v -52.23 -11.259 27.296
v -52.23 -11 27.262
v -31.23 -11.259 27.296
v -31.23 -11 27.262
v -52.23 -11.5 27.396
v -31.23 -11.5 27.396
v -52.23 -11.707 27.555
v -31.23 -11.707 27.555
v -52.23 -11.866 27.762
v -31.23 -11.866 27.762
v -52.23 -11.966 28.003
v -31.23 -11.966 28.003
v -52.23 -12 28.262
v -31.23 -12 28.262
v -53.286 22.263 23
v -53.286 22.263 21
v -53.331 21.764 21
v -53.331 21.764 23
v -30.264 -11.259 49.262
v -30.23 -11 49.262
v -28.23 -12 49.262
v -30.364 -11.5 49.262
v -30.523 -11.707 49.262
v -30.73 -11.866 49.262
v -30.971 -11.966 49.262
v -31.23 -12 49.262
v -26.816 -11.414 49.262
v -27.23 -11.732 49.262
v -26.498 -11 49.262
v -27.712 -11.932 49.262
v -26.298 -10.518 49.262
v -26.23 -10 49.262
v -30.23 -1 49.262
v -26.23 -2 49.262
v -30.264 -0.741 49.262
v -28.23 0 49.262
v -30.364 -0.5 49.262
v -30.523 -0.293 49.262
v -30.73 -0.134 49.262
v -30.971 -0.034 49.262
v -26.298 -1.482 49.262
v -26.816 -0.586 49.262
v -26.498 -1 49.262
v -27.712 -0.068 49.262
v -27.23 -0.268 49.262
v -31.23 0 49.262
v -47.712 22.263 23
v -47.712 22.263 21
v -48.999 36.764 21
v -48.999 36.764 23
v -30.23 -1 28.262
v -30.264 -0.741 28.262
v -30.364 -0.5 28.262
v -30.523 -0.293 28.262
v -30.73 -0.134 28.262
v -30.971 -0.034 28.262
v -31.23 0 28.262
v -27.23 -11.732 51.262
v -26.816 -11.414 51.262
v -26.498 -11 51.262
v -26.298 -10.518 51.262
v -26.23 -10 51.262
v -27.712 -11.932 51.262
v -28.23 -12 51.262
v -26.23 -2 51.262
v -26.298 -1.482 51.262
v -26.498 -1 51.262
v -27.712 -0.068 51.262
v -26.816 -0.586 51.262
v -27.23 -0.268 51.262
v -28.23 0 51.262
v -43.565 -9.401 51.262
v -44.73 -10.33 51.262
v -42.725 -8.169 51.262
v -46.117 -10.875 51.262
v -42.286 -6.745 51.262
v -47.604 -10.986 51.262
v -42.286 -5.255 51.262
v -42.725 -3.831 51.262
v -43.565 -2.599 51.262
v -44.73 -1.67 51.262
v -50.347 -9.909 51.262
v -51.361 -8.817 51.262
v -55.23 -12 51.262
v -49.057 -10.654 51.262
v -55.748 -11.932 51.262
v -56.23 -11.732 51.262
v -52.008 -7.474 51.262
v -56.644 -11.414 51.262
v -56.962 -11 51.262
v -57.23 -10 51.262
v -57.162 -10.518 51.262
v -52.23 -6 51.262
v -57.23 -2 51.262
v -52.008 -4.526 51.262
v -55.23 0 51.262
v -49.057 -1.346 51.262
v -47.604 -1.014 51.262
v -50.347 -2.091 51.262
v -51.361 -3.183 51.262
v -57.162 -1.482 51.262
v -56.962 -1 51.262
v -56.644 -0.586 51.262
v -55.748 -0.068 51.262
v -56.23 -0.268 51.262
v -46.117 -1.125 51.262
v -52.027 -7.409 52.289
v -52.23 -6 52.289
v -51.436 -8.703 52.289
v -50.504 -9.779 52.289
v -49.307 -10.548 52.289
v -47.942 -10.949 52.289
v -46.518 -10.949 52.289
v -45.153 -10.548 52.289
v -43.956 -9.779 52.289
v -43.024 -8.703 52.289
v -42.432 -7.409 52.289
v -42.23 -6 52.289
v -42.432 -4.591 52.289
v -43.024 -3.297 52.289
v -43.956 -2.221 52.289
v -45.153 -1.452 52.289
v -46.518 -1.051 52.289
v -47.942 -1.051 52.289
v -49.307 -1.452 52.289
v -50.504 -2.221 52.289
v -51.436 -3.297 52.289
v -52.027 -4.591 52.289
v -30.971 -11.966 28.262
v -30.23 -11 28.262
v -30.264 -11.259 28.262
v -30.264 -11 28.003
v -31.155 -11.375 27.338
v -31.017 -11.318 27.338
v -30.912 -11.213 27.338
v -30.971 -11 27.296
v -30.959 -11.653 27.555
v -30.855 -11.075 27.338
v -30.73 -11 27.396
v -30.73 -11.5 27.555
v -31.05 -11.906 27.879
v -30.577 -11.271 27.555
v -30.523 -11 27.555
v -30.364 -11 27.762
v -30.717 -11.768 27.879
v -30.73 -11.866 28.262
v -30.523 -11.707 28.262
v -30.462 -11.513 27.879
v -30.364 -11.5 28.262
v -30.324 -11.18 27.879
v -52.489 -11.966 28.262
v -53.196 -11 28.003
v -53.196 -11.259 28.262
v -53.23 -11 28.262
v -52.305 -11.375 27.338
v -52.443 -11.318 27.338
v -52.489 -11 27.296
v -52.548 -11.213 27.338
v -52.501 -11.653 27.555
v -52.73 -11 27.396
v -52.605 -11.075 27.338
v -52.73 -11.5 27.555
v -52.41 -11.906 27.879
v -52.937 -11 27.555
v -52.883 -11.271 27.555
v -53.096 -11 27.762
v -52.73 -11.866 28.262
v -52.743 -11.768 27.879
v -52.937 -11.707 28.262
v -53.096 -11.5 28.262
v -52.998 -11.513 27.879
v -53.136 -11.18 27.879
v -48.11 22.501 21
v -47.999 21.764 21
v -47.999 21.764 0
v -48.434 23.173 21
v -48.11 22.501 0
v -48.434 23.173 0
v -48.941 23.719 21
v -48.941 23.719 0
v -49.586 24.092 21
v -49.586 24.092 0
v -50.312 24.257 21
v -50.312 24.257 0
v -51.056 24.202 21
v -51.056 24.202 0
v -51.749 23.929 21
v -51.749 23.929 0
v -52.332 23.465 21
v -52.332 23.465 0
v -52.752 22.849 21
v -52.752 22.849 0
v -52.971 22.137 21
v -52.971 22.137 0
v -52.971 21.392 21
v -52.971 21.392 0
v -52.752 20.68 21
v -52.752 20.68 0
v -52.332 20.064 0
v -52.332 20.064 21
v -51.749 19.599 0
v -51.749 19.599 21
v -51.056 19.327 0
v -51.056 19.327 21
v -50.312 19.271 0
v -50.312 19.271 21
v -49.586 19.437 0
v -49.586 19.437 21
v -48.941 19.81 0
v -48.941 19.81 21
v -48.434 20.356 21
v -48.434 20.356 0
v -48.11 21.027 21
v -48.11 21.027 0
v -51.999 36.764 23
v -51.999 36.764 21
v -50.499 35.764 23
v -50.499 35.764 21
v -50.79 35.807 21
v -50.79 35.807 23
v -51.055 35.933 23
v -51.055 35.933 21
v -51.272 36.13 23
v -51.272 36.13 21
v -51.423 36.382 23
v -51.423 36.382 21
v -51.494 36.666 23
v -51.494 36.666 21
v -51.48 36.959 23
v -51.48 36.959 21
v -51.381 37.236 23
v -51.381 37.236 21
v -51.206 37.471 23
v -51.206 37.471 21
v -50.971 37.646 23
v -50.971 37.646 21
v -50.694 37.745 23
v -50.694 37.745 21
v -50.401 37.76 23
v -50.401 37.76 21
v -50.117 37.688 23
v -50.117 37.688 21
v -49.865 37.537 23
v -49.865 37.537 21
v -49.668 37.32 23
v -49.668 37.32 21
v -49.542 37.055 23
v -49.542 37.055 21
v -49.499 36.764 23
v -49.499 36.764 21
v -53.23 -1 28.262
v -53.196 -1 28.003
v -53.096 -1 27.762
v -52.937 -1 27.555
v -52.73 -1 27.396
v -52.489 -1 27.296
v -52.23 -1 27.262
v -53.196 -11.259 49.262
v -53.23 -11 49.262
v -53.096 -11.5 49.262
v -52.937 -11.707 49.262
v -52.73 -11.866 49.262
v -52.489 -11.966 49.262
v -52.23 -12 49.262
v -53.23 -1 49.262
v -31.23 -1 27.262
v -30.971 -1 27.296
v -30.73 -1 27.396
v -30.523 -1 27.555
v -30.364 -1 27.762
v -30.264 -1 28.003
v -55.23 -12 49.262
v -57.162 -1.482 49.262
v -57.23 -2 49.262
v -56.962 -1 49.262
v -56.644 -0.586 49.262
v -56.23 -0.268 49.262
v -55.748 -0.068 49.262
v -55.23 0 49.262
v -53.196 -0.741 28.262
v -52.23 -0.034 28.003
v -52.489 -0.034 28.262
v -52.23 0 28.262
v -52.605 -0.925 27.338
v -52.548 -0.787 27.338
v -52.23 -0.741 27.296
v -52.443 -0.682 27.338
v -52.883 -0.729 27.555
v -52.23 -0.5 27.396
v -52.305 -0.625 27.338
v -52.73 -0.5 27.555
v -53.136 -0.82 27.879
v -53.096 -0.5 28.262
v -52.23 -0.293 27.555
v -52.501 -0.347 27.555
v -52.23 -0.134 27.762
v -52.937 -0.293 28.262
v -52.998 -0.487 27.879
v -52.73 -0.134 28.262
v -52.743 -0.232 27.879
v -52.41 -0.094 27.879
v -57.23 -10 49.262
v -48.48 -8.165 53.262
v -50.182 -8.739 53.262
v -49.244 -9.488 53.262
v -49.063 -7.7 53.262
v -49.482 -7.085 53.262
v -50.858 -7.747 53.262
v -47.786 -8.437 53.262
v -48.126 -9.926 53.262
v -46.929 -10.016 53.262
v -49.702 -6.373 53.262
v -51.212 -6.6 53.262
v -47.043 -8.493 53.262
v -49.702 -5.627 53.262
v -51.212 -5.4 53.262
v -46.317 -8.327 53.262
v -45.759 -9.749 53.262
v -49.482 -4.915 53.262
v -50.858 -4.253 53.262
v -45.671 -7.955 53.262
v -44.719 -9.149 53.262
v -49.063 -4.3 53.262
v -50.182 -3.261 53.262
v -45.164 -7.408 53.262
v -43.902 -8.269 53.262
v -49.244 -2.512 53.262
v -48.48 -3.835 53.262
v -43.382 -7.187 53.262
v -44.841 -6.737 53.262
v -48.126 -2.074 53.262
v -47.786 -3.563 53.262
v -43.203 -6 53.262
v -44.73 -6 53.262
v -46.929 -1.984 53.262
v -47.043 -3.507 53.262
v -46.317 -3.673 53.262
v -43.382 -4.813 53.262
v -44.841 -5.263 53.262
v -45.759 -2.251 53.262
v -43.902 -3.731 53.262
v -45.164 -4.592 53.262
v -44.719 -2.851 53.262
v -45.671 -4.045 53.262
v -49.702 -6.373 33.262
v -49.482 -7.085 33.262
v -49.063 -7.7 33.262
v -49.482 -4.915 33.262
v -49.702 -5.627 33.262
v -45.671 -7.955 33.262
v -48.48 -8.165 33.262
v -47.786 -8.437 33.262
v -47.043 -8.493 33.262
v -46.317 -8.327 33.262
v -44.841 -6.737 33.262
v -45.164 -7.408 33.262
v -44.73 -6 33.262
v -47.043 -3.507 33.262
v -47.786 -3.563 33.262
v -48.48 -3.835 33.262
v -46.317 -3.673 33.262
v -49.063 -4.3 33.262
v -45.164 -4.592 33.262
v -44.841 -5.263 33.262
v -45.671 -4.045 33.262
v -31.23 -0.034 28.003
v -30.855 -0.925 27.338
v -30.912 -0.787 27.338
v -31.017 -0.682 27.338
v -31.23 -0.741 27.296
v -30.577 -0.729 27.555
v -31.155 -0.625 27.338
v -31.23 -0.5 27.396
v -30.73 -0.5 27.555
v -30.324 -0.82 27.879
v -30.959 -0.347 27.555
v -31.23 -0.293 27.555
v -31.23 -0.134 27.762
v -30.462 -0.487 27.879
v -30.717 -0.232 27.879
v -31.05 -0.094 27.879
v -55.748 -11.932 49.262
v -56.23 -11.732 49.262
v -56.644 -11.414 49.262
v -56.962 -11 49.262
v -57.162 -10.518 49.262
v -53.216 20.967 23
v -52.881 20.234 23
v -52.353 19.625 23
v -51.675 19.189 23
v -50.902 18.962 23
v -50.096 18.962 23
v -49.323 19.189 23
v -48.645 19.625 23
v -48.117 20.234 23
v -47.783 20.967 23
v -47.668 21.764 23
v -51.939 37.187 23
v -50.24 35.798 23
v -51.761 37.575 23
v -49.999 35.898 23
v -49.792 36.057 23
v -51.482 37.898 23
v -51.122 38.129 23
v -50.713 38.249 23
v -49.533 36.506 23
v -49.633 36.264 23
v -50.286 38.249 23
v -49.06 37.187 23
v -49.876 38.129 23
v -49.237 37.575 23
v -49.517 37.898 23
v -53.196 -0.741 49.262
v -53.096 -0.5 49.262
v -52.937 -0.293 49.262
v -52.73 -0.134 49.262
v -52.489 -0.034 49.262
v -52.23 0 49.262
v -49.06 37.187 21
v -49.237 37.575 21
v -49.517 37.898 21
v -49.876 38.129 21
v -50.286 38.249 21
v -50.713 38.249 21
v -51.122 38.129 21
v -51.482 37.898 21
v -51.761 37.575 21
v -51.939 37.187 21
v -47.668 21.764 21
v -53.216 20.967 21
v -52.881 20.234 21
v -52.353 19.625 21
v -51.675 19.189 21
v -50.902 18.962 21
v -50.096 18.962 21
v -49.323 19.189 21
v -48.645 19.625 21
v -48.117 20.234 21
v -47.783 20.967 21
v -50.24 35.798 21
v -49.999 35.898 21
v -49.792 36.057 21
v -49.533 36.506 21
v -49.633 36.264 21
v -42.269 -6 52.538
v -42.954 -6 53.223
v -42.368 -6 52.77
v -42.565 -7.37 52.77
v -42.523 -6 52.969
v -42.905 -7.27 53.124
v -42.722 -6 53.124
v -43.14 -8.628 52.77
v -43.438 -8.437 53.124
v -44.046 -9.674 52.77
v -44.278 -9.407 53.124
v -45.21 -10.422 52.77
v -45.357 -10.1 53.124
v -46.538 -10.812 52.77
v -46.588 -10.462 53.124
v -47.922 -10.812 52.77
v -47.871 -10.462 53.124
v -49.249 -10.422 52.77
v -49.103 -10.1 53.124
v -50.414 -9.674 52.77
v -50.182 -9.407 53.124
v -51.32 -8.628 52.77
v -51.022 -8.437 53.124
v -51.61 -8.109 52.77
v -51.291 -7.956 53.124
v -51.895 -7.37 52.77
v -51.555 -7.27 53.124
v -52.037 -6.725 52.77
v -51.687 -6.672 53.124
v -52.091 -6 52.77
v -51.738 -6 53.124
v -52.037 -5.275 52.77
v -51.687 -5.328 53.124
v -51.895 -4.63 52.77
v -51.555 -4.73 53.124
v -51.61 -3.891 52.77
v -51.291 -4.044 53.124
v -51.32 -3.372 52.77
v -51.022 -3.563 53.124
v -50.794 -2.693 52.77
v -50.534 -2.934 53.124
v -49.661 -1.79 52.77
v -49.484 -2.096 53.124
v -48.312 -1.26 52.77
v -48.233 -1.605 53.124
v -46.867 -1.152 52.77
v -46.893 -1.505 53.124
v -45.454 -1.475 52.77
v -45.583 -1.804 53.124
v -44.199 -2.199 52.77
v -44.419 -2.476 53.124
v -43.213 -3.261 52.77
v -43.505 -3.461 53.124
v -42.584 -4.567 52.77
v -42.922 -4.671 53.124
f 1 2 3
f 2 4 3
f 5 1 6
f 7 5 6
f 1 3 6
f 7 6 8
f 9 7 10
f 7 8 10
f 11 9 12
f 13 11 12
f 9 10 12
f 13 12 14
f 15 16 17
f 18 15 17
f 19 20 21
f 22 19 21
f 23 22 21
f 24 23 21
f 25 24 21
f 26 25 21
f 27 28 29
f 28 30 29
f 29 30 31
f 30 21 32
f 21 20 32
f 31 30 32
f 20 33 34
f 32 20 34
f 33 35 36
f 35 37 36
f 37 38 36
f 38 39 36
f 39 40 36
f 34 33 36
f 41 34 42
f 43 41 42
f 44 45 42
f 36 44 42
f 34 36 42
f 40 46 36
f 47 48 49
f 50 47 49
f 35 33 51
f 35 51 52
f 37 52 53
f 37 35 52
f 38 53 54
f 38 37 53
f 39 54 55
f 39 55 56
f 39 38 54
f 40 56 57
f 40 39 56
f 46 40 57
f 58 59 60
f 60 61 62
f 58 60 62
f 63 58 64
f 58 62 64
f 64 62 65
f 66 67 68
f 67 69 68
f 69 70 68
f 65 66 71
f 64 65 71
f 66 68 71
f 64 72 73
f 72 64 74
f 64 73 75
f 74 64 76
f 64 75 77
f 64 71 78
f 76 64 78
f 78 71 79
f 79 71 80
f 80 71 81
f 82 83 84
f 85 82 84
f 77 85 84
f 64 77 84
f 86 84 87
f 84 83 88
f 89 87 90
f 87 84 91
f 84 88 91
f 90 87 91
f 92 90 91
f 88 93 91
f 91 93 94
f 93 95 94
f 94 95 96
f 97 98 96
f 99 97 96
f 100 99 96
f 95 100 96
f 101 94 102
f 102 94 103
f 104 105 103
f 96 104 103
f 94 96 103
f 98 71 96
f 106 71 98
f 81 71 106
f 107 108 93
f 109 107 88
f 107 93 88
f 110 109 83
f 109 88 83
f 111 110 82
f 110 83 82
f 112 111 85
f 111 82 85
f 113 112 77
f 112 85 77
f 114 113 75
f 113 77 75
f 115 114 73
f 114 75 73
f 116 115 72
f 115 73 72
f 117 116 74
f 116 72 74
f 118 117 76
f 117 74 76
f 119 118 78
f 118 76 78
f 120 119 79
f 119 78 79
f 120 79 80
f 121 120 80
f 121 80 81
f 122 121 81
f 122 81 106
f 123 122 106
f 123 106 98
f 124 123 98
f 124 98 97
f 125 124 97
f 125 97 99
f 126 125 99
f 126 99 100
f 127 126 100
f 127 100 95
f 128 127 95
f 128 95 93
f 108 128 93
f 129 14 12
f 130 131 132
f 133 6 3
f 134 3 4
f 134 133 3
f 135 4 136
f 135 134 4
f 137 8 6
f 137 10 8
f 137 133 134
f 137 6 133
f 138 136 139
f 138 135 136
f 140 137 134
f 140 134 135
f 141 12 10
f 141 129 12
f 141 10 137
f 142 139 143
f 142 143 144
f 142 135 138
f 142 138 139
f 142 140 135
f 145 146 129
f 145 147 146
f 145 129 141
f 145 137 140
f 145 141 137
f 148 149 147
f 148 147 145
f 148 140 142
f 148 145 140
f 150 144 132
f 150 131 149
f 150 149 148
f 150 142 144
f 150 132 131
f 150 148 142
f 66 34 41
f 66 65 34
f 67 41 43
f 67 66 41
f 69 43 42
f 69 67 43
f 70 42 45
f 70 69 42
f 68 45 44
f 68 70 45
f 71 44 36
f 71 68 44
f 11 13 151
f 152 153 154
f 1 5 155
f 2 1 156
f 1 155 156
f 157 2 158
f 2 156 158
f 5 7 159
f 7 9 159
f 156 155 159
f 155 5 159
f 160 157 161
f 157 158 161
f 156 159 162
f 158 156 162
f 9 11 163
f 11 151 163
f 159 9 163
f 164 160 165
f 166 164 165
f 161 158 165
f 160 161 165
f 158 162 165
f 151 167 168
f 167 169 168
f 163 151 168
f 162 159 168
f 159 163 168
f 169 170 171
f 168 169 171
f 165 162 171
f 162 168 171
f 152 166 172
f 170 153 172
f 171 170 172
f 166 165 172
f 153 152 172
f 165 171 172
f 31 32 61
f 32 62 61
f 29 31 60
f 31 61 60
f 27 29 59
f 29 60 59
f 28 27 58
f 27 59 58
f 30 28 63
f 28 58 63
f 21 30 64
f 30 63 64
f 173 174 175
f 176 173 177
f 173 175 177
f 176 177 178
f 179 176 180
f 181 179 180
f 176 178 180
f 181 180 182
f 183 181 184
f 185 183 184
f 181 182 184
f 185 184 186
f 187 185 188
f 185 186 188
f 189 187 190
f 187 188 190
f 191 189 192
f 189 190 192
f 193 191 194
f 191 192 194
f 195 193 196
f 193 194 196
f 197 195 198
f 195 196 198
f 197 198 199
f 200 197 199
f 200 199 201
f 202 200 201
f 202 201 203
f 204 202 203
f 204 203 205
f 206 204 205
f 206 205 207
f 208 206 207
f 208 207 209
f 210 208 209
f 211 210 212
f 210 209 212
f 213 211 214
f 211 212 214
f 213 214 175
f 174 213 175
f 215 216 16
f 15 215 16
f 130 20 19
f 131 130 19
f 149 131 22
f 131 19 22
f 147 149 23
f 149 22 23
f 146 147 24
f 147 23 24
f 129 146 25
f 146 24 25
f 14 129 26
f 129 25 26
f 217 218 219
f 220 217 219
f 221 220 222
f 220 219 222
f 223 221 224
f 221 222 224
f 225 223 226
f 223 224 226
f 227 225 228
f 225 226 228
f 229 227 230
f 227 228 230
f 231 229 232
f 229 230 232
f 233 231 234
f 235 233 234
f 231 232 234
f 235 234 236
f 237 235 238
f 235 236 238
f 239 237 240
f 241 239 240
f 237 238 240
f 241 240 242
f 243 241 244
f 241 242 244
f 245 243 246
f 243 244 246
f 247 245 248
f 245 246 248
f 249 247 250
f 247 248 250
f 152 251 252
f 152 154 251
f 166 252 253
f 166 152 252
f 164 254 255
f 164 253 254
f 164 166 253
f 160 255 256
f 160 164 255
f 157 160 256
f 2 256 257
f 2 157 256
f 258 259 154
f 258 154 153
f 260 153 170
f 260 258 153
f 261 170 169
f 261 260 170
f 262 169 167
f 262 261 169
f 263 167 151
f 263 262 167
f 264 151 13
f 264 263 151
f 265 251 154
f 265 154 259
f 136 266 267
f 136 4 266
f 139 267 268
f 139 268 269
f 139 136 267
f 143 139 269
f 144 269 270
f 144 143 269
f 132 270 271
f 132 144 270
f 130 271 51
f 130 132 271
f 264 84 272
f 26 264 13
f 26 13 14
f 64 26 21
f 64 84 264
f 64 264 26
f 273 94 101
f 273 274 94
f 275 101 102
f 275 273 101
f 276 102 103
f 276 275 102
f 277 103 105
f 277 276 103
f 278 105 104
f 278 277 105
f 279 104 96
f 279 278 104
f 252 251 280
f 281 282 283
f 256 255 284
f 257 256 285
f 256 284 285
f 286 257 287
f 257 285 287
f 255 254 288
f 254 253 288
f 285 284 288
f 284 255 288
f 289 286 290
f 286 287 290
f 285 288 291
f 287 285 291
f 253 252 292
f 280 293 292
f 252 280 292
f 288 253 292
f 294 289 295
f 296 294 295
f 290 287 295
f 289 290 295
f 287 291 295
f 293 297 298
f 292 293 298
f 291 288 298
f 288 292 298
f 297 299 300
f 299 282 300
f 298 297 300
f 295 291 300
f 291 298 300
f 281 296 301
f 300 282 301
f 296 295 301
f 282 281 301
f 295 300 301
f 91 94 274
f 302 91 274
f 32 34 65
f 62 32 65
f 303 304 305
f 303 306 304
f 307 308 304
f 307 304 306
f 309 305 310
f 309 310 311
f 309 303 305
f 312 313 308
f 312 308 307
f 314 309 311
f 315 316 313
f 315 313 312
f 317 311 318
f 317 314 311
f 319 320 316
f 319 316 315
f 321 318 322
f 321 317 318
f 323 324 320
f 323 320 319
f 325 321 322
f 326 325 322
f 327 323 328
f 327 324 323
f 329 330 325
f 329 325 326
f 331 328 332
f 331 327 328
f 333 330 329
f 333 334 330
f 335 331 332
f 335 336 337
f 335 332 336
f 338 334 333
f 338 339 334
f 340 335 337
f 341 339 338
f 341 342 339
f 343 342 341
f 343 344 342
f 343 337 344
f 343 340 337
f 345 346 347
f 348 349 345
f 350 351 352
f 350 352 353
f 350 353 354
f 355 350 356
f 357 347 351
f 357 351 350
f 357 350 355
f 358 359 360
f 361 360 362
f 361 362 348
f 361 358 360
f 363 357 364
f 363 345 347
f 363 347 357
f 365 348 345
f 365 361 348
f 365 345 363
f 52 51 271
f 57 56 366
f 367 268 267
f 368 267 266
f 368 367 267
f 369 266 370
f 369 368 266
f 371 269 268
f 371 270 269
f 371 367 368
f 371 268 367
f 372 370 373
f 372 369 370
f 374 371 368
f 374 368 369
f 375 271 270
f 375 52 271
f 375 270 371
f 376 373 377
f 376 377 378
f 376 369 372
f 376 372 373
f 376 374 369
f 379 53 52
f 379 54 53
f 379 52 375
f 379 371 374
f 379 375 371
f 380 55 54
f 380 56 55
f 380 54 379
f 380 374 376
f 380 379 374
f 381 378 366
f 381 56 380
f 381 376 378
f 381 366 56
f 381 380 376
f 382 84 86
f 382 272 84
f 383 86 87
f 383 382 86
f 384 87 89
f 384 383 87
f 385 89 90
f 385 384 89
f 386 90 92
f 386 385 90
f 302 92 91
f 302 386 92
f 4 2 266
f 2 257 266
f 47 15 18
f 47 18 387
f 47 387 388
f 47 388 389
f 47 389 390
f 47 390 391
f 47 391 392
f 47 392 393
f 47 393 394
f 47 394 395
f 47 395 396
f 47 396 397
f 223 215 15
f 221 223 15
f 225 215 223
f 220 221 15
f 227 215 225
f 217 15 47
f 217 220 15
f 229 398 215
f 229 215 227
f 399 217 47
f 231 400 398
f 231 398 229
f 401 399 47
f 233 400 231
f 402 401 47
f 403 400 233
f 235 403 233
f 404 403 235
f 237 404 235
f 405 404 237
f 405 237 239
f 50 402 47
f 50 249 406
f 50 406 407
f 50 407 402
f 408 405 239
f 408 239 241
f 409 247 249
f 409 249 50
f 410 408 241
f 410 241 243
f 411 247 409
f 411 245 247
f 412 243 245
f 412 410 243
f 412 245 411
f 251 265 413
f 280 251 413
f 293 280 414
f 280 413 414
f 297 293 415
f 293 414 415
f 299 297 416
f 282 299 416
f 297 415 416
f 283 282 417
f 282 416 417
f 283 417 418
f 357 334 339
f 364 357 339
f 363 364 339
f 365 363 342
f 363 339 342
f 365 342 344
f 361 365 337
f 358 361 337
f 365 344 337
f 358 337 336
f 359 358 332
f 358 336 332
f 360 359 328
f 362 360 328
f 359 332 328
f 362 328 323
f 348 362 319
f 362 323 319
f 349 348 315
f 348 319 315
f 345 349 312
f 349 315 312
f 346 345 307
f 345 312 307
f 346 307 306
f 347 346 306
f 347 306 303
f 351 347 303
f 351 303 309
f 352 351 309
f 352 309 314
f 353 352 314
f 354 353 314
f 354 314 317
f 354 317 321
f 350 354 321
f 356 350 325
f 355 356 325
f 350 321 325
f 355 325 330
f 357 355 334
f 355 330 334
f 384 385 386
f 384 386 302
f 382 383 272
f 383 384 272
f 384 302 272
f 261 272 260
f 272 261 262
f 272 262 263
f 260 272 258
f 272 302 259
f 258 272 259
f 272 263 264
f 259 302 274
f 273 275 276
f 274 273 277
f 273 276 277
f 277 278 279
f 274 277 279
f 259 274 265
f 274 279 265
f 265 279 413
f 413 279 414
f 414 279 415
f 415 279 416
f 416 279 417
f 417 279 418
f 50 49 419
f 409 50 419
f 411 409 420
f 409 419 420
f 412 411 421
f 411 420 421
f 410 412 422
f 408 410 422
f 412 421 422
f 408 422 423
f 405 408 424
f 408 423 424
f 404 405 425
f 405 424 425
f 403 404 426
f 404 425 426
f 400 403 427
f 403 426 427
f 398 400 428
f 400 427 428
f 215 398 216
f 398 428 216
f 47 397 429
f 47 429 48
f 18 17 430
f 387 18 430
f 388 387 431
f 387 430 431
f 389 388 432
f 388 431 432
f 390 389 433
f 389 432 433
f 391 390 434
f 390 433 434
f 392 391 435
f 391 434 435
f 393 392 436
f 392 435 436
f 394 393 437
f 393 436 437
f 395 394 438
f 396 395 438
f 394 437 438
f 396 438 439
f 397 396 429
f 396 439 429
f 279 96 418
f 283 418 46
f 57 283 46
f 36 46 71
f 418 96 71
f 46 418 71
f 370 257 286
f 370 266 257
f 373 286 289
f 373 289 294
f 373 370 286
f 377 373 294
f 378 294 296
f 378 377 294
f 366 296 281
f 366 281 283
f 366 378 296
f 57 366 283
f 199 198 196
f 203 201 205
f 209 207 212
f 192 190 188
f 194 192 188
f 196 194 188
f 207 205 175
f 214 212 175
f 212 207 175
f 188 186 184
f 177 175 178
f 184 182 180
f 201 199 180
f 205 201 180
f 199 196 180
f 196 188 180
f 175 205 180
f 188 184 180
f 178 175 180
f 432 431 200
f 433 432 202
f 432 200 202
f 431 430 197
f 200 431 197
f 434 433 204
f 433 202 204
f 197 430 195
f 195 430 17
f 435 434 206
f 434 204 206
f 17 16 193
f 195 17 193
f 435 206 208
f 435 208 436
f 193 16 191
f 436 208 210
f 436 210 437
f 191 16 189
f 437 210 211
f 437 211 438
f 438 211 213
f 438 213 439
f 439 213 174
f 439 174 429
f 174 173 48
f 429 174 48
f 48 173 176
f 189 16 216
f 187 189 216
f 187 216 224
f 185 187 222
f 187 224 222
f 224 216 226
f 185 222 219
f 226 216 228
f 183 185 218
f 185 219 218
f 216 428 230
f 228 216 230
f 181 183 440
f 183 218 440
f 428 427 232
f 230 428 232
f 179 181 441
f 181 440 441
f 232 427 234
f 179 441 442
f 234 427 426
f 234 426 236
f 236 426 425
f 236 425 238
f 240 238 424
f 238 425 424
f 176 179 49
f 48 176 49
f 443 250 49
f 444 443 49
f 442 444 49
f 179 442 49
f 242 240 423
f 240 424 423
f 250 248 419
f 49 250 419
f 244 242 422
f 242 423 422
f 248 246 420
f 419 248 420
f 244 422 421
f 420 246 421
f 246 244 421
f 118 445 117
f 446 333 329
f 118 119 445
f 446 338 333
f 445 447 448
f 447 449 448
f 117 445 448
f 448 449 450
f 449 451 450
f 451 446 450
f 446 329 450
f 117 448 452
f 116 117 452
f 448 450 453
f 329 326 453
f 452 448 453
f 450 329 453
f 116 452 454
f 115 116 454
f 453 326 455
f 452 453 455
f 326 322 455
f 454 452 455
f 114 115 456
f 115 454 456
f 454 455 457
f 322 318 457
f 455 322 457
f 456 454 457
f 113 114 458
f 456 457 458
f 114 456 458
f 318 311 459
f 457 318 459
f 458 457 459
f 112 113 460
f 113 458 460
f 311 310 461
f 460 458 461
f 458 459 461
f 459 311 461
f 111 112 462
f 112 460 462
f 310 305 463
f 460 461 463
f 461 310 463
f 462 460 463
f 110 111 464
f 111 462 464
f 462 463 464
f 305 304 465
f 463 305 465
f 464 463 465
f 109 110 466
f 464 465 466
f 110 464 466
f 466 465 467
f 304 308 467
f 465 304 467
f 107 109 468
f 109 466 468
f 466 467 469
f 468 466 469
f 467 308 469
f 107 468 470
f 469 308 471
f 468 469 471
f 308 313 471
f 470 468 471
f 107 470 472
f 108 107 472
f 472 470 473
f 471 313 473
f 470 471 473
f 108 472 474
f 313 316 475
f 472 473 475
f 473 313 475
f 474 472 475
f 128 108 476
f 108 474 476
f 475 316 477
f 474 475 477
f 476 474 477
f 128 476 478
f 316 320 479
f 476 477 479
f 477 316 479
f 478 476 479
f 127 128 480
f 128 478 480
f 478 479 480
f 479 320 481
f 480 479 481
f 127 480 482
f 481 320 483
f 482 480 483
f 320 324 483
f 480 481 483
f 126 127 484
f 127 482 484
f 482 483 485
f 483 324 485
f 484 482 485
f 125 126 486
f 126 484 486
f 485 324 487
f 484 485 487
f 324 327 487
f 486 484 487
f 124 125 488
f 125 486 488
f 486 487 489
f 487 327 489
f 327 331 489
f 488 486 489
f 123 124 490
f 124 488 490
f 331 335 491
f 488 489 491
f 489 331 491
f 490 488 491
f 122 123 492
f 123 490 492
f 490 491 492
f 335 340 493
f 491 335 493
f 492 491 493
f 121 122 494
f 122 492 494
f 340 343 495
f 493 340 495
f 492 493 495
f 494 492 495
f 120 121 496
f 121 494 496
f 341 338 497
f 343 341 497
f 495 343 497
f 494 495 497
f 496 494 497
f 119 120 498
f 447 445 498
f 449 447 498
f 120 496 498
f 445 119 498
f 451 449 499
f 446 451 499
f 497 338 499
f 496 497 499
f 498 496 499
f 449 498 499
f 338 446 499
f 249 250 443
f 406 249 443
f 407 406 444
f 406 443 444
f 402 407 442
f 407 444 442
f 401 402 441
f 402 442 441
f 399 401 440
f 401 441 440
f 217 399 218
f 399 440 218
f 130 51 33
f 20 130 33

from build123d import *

# Parameters (mm, degrees)
F0_W      = 23
F0_H      = 22
F1_DEPTH  = 12
F2_R      = 1
F3_R      = 2
F5_DEPTH  = 2
F7_R      = 2.5
F8_DEPTH  = 20
F9_R      = 2.5
F10_DEPTH = 21
F12_DEPTH = 2


# Not quite as in the source:
# - a fillet or chamfer that OpenCascade refuses, or shapes differently, is made with other operations: its cross-section is extruded or revolved along the edge and cut away or added


with BuildPart() as f1:
    # F0 (on Front) → F1 (new body)
    with BuildSketch(Plane.XZ):
        Polygon((-53.2299494938, 49.2620729506), (-30.2299494938, 49.2620729506), (-26.2299494938, 49.2620729506), (-26.2299494938, 51.2620729506), (-57.2299494938, 51.2620729506), (-57.2299494938, 49.2620729506), align=None)
        with Locations((-41.7299494938, 38.2620729506)):
            Rectangle(F0_W, F0_H)
    extrude(amount=F1_DEPTH)

    # F2
    f2_edges = [f1.edges().sort_by_distance(p)[0] for p in [
        (-53.229949, -12, 38.262073),
        (-30.229949, -12, 38.262073),
        (-53.229949, 0, 38.262073),
        (-30.229949, 0, 38.262073),
        (-41.729949, -12, 27.262073),
        (-53.229949, -6, 27.262073),
        (-30.229949, -6, 27.262073),
        (-41.729949, 0, 27.262073),
    ]]
    fillet(f2_edges, radius=F2_R)

    # F3
    f3_edges = [f1.edges().sort_by_distance(p)[0] for p in [
        (-26.229949, -12, 50.262073),
        (-26.229949, 0, 50.262073),
        (-57.229949, -12, 50.262073),
        (-57.229949, 0, 50.262073),
    ]]
    fillet(f3_edges, radius=F3_R)

    # F4 (on face) → F5 (join)
    with BuildSketch(Plane.XY.offset(51.2620729506)):
        with BuildLine():
            ThreePointArc((-42.2299494938, -6), (-47.2299494938, -1), (-52.2299494938, -6))
            ThreePointArc((-52.2299494938, -6), (-47.2299494938, -11), (-42.2299494938, -6))
        make_face()
    extrude(amount=F5_DEPTH)

    # F6: fillet of radius 1 on 1 edges, made by hand

    # F6_s1 → F6_t2 (revolve, cut)
    with BuildSketch(Plane.XZ.offset(6)):
        with BuildLine():
            ThreePointArc((-42.2295494938, 52.2611072652), (-42.5228427126, 52.9691797318), (-43.2309151792, 53.2624729506))
            Line((-43.2309151792, 53.2624729506), (-43.2309151792, 53.3626095191))
            ThreePointArc((-43.2309151792, 53.3626095191), (-42.7304323365, 53.3622095191), (-42.2299494938, 53.3622095191))
            Line((-42.2299494938, 53.3622095191), (-42.1298129252, 53.2620729506))
            ThreePointArc((-42.1298129252, 53.2620729506), (-42.1298129252, 52.7615901079), (-42.1294129252, 52.2611072652))
            Line((-42.1294129252, 52.2611072652), (-42.2295494938, 52.2611072652))
        make_face()
    revolve(axis=Axis((-47.2299494938, -6, 53.2620729506), (0, 0, -1)), mode=Mode.SUBTRACT)

    # F7 (on face) → F8 (cut)
    with BuildSketch(Plane.XY.offset(53.2620729506)):
        with Locations((-47.2299494938, -6)):
            Circle(F7_R)
    extrude(amount=-F8_DEPTH, mode=Mode.SUBTRACT)


with BuildPart() as f10:
    # F9 (on Top) → F10 (new body)
    with BuildSketch(Plane.XY):
        with Locations((-50.499279052, 21.7643305659)):
            Circle(F9_R)
    extrude(amount=F10_DEPTH)

    # F11 (on face) → F12 (join)
    with BuildSketch(Plane.XY.offset(21)):
        with BuildLine():
            Line((-50.499279052, 35.2643305659), (-50.499279052, 24.5955677889))
            ThreePointArc((-50.499279052, 24.5955677889), (-48.6821090098, 23.9354586715), (-47.7122932643, 22.2629430725))
            Line((-47.7122932643, 22.2629430725), (-48.999279052, 36.7643305659))
            ThreePointArc((-48.999279052, 36.7643305659), (-49.4386188802, 35.7036703941), (-50.499279052, 35.2643305659))
        make_face()
        with BuildLine():
            ThreePointArc((-53.2862648398, 22.2629430725), (-52.3164490942, 23.9354586715), (-50.499279052, 24.5955677889))
            Line((-50.499279052, 24.5955677889), (-50.499279052, 35.2643305659))
            ThreePointArc((-50.499279052, 35.2643305659), (-51.5599392238, 35.7036703941), (-51.999279052, 36.7643305659))
            Line((-51.999279052, 36.7643305659), (-53.2862648398, 22.2629430725))
        make_face()
        with BuildLine():
            ThreePointArc((-47.7122932643, 22.2629430725), (-48.6821090098, 23.9354586715), (-50.499279052, 24.5955677889))
            ThreePointArc((-50.499279052, 24.5955677889), (-52.3164490942, 23.9354586715), (-53.2862648398, 22.2629430725))
            Line((-53.2862648398, 22.2629430725), (-53.330516275, 21.7643305659))
            ThreePointArc((-53.330516275, 21.7643305659), (-50.499279052, 18.9330933429), (-47.668041829, 21.7643305659))
            Line((-47.668041829, 21.7643305659), (-47.7122932643, 22.2629430725))
        make_face()
        with BuildLine():
            ThreePointArc((-47.999279052, 21.7643305659), (-52.267046005, 19.996563613), (-50.499279052, 24.2643305659))
            ThreePointArc((-50.499279052, 24.2643305659), (-48.7315120991, 23.5320975189), (-47.999279052, 21.7643305659))
        make_face(mode=Mode.SUBTRACT)
        with BuildLine():
            ThreePointArc((-47.999279052, 21.7643305659), (-48.7315120991, 23.5320975189), (-50.499279052, 24.2643305659))
            ThreePointArc((-50.499279052, 24.2643305659), (-52.267046005, 19.996563613), (-47.999279052, 21.7643305659))
        make_face()
        with BuildLine():
            ThreePointArc((-51.999279052, 36.7643305659), (-51.5599392238, 35.7036703941), (-50.499279052, 35.2643305659))
            ThreePointArc((-50.499279052, 35.2643305659), (-49.4386188802, 35.7036703941), (-48.999279052, 36.7643305659))
            ThreePointArc((-48.999279052, 36.7643305659), (-50.499279052, 38.2643305659), (-51.999279052, 36.7643305659))
        make_face()
        with BuildLine():
            ThreePointArc((-49.499279052, 36.7643305659), (-49.7921722708, 36.0572237847), (-50.499279052, 35.7643305659))
            ThreePointArc((-50.499279052, 35.7643305659), (-51.2063858332, 37.4714373471), (-49.499279052, 36.7643305659))
        make_face(mode=Mode.SUBTRACT)
    extrude(amount=F12_DEPTH)


solid = Compound([f1.part, f10.part])
